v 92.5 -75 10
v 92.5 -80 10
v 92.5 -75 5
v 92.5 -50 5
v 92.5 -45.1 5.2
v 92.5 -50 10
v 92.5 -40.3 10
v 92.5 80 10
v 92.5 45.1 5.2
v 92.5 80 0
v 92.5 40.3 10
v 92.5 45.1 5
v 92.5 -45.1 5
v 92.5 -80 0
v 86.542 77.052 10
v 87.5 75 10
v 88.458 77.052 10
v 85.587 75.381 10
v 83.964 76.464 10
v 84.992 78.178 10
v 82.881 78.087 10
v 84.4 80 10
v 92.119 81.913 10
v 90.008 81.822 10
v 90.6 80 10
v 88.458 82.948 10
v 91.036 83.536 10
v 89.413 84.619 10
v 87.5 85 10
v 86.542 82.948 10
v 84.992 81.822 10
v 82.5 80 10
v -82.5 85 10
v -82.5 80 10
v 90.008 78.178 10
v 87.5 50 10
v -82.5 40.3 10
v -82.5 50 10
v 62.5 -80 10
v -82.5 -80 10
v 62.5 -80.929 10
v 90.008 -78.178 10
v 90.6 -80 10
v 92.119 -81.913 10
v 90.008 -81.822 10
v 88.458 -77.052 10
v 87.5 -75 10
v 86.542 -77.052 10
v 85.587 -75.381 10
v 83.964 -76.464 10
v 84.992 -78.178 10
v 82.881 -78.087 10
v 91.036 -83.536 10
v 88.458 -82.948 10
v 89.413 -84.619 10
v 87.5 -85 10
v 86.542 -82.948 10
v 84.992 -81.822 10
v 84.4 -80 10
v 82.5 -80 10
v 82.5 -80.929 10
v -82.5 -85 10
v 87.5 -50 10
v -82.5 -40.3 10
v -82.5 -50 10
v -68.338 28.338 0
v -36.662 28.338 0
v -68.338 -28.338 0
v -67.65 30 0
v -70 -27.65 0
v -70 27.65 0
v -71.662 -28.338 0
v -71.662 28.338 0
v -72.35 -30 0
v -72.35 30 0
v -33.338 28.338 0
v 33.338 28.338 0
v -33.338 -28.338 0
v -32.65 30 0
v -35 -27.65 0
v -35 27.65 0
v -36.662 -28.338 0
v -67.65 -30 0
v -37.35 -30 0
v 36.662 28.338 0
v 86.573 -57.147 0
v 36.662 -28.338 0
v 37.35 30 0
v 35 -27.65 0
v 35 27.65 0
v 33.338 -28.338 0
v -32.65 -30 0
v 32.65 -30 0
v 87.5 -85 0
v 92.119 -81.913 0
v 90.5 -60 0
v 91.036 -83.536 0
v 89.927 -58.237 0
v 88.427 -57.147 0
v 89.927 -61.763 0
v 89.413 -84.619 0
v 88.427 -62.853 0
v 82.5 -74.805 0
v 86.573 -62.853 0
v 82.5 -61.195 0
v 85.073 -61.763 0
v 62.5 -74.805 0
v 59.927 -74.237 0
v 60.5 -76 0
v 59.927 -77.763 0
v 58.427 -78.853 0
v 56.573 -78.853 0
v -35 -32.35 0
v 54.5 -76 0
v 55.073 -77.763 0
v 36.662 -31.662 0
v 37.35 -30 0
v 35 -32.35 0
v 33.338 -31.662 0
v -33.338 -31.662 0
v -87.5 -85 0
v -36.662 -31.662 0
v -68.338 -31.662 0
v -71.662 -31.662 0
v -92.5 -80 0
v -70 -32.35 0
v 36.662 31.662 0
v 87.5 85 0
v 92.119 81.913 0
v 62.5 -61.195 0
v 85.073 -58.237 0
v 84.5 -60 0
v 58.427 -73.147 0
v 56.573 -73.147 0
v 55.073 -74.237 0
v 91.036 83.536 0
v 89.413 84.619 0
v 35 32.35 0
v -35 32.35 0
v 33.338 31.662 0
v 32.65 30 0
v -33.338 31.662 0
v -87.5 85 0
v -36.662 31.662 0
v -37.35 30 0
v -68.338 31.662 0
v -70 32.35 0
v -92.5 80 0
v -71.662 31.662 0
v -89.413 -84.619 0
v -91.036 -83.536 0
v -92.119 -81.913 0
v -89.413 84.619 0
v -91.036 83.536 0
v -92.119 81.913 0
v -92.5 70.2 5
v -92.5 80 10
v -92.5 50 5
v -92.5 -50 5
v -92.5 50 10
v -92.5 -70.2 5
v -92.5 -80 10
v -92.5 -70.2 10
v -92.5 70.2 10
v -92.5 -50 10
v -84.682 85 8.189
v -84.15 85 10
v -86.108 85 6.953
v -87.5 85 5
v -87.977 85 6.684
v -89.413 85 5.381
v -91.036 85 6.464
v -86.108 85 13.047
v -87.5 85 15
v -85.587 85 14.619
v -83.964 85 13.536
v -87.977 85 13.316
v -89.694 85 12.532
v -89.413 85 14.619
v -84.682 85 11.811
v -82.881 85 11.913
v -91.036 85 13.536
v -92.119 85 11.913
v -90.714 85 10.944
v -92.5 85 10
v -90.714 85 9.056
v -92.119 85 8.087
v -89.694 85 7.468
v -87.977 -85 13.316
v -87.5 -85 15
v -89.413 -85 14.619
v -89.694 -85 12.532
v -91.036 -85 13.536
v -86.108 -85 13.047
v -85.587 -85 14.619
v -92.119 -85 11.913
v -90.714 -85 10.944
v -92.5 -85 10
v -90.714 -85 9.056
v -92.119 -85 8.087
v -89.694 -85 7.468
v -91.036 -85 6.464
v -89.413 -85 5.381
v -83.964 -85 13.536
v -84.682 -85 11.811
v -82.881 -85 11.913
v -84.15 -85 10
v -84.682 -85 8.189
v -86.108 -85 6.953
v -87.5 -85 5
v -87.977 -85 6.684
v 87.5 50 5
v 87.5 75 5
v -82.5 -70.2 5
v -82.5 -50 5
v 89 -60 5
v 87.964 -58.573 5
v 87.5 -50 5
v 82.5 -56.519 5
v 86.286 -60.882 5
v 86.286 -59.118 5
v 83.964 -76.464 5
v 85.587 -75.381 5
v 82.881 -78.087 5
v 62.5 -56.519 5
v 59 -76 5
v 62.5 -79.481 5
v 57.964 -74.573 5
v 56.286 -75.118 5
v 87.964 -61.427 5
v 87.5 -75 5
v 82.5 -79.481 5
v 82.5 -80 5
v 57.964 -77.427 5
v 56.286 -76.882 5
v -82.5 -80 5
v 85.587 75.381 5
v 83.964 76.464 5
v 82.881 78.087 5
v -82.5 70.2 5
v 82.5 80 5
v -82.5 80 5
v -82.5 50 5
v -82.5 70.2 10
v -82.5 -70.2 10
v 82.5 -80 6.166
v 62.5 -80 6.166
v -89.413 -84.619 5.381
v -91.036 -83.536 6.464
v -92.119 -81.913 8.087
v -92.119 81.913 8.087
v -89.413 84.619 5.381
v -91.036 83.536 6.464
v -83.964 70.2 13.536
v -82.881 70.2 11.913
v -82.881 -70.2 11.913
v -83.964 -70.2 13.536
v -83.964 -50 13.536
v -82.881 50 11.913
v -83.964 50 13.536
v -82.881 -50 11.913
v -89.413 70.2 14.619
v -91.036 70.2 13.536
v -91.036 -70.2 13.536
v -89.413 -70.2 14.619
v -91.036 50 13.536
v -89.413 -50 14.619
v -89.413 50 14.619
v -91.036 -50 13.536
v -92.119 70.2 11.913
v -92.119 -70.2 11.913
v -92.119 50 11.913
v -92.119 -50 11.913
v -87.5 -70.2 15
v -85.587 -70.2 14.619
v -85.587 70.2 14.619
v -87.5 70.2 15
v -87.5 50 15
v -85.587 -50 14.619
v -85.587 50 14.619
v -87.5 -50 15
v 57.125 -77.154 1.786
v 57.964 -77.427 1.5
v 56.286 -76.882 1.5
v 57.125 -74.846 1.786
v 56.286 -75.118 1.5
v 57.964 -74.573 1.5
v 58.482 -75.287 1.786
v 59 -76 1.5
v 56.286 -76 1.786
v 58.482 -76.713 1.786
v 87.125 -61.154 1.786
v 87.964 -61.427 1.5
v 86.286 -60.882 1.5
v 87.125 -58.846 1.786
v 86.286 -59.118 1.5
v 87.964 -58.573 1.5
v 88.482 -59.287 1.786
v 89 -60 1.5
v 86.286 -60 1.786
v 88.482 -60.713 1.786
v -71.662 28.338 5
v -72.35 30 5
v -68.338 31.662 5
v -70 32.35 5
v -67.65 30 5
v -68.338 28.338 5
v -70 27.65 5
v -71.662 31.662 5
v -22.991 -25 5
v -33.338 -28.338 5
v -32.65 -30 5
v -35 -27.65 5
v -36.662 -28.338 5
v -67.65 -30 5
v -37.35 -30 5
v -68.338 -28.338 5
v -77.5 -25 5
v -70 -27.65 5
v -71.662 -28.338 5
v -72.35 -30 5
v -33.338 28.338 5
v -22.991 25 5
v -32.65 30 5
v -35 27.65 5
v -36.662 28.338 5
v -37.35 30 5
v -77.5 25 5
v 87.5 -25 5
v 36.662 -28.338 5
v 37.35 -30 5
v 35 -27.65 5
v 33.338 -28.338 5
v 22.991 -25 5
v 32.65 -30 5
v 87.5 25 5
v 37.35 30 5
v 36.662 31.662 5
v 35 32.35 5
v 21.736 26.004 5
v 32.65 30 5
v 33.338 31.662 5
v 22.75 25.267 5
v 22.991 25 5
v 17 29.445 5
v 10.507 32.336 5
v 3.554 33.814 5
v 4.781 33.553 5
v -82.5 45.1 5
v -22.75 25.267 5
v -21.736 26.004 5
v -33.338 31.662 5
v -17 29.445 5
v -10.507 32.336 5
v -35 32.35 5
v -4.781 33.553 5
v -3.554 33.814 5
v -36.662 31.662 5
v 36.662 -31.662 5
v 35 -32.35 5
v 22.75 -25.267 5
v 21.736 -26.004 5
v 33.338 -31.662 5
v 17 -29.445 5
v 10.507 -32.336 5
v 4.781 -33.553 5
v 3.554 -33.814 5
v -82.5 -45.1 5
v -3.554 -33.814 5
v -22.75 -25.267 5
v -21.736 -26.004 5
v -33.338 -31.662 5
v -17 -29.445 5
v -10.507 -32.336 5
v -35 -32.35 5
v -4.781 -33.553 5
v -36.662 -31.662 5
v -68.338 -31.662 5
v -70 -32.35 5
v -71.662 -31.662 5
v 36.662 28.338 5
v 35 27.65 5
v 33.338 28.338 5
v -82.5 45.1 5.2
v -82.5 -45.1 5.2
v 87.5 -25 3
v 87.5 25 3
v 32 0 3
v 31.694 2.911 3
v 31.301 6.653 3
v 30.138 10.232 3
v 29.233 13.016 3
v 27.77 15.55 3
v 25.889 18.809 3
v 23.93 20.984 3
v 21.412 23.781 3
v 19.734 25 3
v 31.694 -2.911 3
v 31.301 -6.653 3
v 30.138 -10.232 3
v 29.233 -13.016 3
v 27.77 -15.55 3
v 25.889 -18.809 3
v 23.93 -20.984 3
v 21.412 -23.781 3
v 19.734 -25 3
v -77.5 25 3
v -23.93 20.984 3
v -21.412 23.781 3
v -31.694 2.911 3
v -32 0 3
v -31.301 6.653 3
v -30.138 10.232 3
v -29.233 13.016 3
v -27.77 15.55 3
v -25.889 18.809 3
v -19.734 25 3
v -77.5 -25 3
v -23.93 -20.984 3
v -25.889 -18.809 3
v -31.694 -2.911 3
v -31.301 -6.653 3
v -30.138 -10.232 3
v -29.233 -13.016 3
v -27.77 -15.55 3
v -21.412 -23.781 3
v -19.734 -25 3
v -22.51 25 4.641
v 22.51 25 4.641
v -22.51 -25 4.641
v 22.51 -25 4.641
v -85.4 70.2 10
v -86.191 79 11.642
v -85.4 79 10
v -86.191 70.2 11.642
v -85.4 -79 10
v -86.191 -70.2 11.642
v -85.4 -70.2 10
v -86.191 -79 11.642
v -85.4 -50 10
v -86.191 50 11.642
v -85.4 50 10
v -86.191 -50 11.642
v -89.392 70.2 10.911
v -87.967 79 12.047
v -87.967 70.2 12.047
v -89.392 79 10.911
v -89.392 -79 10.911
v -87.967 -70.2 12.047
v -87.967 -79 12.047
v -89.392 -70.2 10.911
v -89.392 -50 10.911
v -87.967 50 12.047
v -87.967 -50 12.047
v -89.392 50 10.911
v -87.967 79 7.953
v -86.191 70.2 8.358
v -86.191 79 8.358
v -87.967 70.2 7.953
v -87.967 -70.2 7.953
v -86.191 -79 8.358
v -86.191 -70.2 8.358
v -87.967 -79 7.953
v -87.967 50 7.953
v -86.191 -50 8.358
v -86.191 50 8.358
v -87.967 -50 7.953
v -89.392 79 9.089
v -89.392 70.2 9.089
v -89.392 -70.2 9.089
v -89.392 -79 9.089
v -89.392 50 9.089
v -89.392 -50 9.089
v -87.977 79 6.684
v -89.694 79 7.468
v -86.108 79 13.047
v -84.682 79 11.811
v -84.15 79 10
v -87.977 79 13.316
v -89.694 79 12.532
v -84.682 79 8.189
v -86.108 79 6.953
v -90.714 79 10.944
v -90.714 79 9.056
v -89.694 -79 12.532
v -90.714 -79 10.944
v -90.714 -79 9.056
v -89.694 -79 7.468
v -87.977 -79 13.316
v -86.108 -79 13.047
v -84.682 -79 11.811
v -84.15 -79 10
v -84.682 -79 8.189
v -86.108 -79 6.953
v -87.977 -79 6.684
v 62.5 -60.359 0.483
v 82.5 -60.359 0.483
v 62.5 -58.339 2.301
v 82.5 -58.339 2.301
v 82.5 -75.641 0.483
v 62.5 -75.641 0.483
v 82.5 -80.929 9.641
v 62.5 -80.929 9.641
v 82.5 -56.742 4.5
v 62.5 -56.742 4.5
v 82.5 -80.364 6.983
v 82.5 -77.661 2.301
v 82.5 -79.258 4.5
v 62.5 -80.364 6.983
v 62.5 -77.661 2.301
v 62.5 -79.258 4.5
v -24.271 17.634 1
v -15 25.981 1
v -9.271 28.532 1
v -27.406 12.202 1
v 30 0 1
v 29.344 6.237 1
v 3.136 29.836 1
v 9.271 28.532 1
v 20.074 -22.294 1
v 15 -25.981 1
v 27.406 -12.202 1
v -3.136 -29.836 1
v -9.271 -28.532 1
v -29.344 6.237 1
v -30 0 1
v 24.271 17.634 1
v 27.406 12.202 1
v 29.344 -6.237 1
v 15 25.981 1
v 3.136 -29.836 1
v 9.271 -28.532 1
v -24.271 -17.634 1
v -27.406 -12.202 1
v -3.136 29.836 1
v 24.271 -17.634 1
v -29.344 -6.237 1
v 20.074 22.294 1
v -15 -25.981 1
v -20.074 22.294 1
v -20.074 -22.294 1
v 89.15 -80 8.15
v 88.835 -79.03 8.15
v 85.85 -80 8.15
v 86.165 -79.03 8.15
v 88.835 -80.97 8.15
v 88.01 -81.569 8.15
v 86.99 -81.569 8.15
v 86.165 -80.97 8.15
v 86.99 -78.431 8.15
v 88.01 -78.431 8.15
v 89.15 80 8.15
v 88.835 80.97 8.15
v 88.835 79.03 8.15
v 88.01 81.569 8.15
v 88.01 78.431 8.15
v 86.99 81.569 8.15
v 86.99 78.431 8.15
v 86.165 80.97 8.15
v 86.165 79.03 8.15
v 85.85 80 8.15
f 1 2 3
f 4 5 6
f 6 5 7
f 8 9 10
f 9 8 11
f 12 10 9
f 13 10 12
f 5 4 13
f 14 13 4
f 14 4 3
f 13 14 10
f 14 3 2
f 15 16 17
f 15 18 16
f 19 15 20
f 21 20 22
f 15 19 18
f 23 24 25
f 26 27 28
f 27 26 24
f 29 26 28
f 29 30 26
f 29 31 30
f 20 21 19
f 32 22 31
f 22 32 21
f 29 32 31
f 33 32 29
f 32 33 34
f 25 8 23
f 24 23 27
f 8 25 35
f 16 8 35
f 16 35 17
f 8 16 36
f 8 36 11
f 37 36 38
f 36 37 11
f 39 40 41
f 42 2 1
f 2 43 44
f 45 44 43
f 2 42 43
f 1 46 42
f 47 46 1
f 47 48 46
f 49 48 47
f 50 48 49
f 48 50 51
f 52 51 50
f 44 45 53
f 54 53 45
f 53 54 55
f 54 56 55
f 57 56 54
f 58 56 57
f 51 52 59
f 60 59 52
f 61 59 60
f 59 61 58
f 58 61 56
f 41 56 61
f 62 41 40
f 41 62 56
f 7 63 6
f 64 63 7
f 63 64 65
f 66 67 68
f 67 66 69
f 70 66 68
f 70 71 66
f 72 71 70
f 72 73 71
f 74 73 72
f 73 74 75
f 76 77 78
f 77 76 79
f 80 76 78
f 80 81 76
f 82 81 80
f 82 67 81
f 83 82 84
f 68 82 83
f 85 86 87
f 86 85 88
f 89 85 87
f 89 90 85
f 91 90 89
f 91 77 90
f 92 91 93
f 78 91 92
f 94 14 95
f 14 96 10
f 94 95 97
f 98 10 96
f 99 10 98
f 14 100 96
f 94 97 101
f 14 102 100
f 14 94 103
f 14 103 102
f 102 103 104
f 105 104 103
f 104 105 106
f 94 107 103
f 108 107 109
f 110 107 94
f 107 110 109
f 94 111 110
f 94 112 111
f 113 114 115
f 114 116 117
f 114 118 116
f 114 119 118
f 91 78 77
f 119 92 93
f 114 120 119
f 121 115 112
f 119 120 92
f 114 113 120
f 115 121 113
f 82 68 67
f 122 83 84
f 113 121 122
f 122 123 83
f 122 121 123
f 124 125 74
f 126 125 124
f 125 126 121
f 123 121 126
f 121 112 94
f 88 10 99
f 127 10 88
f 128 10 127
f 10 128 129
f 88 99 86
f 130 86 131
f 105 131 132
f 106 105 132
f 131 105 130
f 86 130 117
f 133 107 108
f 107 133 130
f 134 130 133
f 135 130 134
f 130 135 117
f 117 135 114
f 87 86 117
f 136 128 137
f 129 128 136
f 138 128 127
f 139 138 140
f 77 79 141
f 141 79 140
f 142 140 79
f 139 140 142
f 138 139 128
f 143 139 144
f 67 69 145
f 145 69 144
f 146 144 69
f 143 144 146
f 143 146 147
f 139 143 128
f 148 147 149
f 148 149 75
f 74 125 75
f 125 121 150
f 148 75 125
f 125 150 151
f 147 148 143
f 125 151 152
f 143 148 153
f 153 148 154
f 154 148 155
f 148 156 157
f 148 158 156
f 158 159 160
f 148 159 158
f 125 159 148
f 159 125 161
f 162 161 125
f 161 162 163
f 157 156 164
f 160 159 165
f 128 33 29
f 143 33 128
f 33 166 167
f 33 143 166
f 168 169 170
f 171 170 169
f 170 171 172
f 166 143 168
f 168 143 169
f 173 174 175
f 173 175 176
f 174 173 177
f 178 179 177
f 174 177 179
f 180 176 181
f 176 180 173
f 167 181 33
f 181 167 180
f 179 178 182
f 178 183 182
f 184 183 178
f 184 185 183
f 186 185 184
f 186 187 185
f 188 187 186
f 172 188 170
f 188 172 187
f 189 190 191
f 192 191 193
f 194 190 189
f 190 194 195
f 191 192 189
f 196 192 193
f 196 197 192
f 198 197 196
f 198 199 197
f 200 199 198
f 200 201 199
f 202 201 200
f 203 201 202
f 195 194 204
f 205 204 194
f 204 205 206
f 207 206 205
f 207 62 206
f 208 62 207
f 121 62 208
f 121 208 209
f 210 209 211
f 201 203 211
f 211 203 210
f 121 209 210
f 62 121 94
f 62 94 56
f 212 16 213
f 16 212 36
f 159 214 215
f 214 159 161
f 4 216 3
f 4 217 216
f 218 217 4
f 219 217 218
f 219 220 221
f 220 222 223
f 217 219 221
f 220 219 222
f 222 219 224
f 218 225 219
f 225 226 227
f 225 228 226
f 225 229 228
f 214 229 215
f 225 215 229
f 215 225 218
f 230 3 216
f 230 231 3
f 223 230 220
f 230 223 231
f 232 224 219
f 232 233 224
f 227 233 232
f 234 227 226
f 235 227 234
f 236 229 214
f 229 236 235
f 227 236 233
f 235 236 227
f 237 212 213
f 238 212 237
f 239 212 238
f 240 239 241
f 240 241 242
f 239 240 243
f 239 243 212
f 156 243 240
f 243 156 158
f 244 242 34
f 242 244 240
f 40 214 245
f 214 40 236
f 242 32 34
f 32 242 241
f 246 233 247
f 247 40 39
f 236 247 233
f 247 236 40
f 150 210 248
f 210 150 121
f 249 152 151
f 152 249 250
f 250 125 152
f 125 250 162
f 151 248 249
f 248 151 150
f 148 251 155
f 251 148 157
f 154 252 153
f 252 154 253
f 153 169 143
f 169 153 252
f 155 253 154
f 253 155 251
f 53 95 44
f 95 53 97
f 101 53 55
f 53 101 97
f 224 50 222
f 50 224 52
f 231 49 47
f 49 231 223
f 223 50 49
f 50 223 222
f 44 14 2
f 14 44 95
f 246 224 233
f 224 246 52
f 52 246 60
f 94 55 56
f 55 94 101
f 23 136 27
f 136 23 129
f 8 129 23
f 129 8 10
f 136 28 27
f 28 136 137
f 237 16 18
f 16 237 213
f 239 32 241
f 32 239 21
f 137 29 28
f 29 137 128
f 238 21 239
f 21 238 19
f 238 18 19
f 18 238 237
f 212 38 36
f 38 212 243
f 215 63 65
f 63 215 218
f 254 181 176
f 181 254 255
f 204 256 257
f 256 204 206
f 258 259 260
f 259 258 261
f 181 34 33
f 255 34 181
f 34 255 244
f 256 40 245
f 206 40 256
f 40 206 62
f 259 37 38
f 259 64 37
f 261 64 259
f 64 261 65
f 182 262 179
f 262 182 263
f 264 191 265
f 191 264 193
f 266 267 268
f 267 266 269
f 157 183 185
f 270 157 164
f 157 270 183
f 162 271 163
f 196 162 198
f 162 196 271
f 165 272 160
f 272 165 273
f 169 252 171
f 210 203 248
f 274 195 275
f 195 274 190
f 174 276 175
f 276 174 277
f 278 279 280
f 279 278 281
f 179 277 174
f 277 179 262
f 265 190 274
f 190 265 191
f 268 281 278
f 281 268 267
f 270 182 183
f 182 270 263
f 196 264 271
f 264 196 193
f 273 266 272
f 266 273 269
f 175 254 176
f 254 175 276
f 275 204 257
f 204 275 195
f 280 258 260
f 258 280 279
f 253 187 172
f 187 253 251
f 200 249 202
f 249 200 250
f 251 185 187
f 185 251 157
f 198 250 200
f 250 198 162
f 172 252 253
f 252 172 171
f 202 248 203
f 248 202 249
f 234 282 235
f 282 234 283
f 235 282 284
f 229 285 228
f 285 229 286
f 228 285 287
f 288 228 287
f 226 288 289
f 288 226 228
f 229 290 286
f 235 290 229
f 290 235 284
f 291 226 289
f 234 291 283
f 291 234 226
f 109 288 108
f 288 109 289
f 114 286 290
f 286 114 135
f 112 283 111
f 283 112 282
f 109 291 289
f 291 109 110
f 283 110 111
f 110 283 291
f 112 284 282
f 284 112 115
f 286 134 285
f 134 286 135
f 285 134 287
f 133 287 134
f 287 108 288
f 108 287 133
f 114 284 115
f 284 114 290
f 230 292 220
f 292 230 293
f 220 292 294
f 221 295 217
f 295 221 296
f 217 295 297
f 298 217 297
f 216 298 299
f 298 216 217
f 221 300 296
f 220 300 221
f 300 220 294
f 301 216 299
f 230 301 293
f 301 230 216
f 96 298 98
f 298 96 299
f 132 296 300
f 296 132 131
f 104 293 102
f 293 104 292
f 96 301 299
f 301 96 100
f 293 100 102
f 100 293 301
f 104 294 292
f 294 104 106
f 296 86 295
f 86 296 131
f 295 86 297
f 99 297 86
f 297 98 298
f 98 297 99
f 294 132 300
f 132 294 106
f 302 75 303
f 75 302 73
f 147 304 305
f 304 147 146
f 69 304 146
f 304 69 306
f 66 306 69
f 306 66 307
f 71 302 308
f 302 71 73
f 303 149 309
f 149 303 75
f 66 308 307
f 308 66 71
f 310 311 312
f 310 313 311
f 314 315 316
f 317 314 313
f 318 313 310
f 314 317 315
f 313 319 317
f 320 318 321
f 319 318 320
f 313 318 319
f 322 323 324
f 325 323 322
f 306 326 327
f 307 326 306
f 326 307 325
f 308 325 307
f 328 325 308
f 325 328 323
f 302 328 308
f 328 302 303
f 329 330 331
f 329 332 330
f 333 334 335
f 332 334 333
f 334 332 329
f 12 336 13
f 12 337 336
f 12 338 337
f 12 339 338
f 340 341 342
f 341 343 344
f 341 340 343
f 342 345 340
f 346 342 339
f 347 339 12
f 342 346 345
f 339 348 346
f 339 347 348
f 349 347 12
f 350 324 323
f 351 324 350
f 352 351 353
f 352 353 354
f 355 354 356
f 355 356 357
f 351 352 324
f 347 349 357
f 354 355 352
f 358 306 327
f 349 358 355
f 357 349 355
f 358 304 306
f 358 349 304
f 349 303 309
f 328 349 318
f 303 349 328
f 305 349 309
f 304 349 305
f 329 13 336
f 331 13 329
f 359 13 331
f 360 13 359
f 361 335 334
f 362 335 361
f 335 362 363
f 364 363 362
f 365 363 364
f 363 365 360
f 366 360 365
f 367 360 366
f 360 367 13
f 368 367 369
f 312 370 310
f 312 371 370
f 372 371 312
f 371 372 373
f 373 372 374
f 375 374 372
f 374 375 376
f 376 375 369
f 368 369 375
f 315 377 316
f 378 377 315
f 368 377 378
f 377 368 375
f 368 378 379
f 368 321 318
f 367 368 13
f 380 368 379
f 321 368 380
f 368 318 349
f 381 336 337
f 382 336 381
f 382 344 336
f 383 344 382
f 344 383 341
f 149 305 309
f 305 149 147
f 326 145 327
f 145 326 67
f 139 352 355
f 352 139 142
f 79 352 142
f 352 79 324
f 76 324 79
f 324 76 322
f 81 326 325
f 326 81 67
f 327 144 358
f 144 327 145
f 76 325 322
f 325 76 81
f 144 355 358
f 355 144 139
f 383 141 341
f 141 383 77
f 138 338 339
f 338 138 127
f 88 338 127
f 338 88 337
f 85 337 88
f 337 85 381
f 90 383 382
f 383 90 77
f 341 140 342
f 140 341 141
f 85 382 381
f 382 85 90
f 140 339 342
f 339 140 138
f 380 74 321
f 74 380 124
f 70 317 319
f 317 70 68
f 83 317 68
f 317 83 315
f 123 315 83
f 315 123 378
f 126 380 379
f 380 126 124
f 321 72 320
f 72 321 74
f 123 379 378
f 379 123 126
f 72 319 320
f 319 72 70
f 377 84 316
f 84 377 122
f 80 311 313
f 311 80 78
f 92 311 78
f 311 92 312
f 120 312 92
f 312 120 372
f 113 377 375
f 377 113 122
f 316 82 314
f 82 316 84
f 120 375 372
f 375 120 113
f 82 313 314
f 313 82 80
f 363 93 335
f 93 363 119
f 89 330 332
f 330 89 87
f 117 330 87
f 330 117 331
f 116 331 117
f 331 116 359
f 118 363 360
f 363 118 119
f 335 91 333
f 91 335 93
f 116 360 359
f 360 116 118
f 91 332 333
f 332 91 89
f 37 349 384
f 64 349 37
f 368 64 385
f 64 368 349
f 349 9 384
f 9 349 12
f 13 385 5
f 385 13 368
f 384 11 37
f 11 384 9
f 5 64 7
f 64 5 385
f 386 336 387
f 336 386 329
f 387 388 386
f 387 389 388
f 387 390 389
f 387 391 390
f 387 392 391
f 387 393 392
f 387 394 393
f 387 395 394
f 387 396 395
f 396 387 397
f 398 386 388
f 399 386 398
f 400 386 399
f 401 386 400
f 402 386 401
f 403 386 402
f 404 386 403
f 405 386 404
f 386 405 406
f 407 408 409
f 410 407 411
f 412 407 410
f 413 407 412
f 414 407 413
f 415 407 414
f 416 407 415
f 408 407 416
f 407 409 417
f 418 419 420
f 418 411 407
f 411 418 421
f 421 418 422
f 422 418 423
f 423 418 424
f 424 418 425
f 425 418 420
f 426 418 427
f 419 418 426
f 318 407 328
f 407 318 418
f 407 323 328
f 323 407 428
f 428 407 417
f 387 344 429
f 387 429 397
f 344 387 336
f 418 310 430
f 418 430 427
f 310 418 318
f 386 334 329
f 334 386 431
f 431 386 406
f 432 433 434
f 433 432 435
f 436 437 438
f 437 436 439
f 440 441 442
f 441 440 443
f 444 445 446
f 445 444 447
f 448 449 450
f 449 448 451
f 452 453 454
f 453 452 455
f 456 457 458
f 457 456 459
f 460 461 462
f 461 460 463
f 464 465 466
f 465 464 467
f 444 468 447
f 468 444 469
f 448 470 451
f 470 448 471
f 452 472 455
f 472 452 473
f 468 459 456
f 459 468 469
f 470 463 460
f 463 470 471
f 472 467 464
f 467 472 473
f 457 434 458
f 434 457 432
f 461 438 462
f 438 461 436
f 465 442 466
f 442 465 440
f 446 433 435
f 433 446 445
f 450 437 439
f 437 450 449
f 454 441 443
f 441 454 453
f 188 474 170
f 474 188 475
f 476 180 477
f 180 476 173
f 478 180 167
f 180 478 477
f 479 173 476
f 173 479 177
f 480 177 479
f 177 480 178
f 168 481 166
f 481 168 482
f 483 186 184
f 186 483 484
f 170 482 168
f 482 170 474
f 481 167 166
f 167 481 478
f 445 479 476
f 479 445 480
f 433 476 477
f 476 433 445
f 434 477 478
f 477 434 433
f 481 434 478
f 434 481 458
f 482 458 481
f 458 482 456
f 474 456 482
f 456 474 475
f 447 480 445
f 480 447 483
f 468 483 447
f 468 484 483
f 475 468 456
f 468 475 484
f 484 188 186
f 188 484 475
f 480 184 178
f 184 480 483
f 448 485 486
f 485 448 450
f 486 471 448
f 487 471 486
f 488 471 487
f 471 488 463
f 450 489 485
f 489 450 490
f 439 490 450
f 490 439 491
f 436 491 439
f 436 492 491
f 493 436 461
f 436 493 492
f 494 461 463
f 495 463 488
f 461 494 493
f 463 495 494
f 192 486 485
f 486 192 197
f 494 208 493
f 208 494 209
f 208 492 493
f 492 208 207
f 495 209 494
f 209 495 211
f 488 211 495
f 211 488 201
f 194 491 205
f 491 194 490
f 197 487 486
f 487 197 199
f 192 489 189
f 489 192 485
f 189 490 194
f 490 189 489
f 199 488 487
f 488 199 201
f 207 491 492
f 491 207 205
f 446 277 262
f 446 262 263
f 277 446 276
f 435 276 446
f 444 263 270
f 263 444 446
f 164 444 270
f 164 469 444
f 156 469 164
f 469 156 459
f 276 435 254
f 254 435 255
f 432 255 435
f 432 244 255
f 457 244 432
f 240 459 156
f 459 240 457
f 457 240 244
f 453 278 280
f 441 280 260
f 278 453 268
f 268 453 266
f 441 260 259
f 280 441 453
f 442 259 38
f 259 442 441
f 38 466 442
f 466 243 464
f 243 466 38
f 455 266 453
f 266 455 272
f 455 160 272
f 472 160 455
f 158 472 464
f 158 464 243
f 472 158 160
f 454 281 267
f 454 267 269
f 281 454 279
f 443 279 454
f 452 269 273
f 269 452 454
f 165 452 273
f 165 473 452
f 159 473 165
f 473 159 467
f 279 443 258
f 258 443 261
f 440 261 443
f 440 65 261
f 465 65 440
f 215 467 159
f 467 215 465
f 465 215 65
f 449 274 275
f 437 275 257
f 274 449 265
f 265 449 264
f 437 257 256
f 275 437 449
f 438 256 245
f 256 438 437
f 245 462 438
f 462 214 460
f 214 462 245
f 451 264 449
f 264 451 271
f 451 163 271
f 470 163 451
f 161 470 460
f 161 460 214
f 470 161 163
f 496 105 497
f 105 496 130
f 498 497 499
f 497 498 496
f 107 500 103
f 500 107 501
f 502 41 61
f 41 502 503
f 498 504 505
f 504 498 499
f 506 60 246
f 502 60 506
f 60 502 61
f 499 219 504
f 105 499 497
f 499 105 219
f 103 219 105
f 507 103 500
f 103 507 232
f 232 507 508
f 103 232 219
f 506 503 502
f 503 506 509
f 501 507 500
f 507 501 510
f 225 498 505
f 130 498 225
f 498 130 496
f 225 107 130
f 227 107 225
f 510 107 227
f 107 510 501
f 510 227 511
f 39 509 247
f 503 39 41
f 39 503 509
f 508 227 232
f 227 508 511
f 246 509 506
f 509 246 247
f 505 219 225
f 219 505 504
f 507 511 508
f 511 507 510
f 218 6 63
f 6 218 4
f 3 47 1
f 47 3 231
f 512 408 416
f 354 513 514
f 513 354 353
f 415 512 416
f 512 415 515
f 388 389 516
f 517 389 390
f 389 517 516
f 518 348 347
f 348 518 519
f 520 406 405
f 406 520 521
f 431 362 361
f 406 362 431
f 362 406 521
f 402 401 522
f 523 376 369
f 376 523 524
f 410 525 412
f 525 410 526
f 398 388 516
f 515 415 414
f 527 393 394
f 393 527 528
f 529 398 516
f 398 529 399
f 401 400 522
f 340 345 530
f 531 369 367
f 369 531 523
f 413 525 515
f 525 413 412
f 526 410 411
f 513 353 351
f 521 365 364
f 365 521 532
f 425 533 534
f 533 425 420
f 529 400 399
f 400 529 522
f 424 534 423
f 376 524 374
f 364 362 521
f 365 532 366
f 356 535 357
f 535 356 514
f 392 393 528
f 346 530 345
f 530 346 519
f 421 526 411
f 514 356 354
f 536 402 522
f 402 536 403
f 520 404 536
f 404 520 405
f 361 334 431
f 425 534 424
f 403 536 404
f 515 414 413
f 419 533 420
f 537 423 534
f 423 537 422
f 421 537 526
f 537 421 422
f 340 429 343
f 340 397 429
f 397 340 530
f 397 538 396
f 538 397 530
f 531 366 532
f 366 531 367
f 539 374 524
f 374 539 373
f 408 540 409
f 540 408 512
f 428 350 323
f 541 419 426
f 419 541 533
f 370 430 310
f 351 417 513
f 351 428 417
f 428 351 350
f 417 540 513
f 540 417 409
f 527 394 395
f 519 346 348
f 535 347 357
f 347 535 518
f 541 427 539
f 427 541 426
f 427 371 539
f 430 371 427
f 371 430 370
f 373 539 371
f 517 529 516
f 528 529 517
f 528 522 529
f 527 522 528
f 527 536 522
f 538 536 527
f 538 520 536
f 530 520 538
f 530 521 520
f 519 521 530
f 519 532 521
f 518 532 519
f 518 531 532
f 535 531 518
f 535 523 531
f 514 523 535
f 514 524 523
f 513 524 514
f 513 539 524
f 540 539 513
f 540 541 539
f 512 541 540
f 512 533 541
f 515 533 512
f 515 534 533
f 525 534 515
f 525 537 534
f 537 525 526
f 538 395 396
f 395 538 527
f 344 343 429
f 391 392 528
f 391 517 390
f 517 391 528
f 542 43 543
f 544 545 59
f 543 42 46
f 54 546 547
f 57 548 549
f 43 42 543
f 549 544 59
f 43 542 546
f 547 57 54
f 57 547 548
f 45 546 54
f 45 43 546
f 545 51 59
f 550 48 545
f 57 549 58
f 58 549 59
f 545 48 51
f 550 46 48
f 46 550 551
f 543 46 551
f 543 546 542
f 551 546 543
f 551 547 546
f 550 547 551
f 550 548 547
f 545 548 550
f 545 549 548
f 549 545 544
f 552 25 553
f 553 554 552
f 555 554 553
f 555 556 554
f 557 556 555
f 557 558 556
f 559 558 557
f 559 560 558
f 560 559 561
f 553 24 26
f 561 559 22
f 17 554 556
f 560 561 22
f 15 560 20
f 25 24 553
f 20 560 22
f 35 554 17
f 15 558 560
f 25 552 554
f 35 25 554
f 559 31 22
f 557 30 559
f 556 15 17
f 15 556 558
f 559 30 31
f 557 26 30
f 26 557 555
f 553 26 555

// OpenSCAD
// file: config_4x5.scad
/*
This is the base configuration file for the 4x5" format
# we are not using the exact ANSI measures, but slightly rounded measures for slight simplification
*/
vStabilizerTotal_h = 7;

// general tolerance
vTolerance = 0.2;

// sheet film and cassette measurements (roughly based on the ANSI measurements)
vFilmSheet_l = 127;
vFilmSheet_w = 102;
vCassette_l = 160; // A min
vCassette_w = 121; // B max
vCassette_h = 13.2; // C max
vLightTrap_l = 2; // M2
vLightTrap_w = vCassette_w;
vLightTrap_h = 1.5; // M1
vLightTrap_offsetX = 141; // G max
vFilmWindow_l = 121;
vFilmWindow_w = 101;
vFilmWindow_offsetX = 16;
vGroundGlass_offsetZ = 5;

// Graflok
vGraflok_h = 6; // this is not the official measurement, just measured from a camera 

// lens board measures (we are using Wista/Technika-style lensboards)
vLensboard_l = 100;
vLensboard_w = 97;
vLensboard_h = 2;
vLensboard_offsetX = -(vLensboard_l+3)/2; // caution: we have an asymetric offset!
vLensboard_offsetY = -vLensboard_w/2;
vLensboardHole_d = 85;
vLensboardLighttrap_d = 89;
vLensboardLighttrap_h = 1+vTolerance;

// bellows frame measures - the bellows frame design is derived from standardcameras.com
// back frame
vBellowsBackInner_l = 144; //???? check and replace with the measurement from your bellows!
vBellowsBackInner_w = vBellowsBackInner_l;
vBellowsBackOuter_l = vBellowsBackInner_l+1;
vBellowsBackOuter_w = vBellowsBackOuter_l;

vBellowsBackFrameOuter_l = 159;
vBellowsBackFrameOuter_w = vBellowsBackFrameOuter_l;
vBellowsBackFrameOuter_h = 7;
vBellowsBackFrameInner_l = 135;
vBellowsBackFrameInner_w = vBellowsBackFrameInner_l;
vBellowsBackFrameInner_h = 5;

vBellowsBackLightTrapOuter_l = vBellowsBackFrameInner_l+2*2;
vBellowsBackLightTrapOuter_w = vBellowsBackLightTrapOuter_l;
vBellowsBackLightTrap_h = 3;

//vBellowsBackFrameScrewHole_d = 2;
//vBellowsBackFrameScrewHole_h = 10;
vBellowsBackFrameScrewHole_offsetXY = 70;
vBellowsBackFrameScrewHole_offsetZ = vBellowsBackFrameOuter_h/2;

// front frame
vBellowsFrontInner_l = 94; //???? check and replace with the measurement from your bellows!
vBellowsFrontInner_w = vBellowsFrontInner_l;
vBellowsFrontOuter_l = vBellowsFrontInner_l+1;
vBellowsFrontOuter_w = vBellowsFrontOuter_l;

vBellowsFrontFrameOuter_l = 104;
vBellowsFrontFrameOuter_w = vBellowsFrontFrameOuter_l;
vBellowsFrontFrameOuter_h = 7;
vBellowsFrontFrameInner_l = 82;
vBellowsFrontFrameInner_w = vBellowsFrontFrameInner_l;
vBellowsFrontFrameInner_h = 5;

vBellowsFrontLightTrapOuter_l = vBellowsFrontFrameInner_l+2*2;
vBellowsFrontLightTrapOuter_w = vBellowsFrontLightTrapOuter_l;
vBellowsFrontLightTrap_h = 0;

//vBellowsFrontFrameScrewHole_d = 2;
//vBellowsFrontFrameScrewHole_h = 10;
vBellowsFrontFrameScrewHole_offsetXY = 40;
vBellowsFrontFrameScrewHole_offsetZ = vBellowsFrontFrameOuter_h/2;

// body dimensions
vWall_strength = 5;
vBodyOuter_l = 185; // make sure this is at least 4*vWall_strength larger than vBellowsBackFrameOuter_l!
vBodyOuter_w = 170; // make sure this is at least 2*vWall_strength larger than vBellowsBackFrameOuter_l!
vBodyOuter_h = 65;
vBodyEdge_r = vWall_strength;

// we will center our model on the Y axis and on the center of the bellows frame
// at least for the 4x5 version, we have to do an asymetric offset of 2.5mm on the X-axis 
vAsymOffsetX = -2.5;  

// back plate
vBackPlateLength = 160; // we will probably use about the same size as the bellows back frame
vBackPlateStrength = vWall_strength;

// hinges for front lid
vHingeInnerDistance = 100;
vHingeBaseWidth = 20;
vHingeHole = 4;

// lid lock measures
vLidLockBase_d = 8;
vLidLockHole_distance = 70;

// rail dimensions
vLowerRail_w = 90;
vUpperRail_w = vLowerRail_w;

// cutout for stop indents
vStopIndent_l = 4;
vStopIndent_h = 5;
vStopIndentDistance = 25; // shorter than 25 is not necessary
vStopIndent_offsetX = 20; // don't go shorter than 20 if you intend to use a 90mm lens!

// for all dovetails we use a base width of 5mm and a base height of 5mm
// we are applying tolerances to the inner AND outer part of a dovetail, in width and height
vDoveTail_w = 5;
vDoveTail_h = 5;
vDoveTail_tolerance = 0.2;

// front standard carrier / slider
// width is depending on vUpperRail_w
vSliderBase_w = vUpperRail_w + (4*vDoveTail_w);
vSliderBase_l = 40; // make sure to have enough space in the body.


// lever plate 
vLeverPlateBase_w = vUpperRail_w - (8*vDoveTail_w);
vLeverPlateBlock_w = 25;
vLeverPlateBlock_l = vSliderBase_l-(2*vDoveTail_w);

vFrontStandard_h = 130;
vFrontStandardSlot_h = vFrontStandard_h - 30;

// lensboard carrier
vFrontPlate_length = vSliderBase_w+6; // vSliderBase_w is a bit too tight for 4x5", so there we will add 5mm, for 5x7 vSliderBase_w is OK to get a squared lensboard carrier
vFrontPlate_width = vSliderBase_w; //vFrontPlate_length;
vFrontPlate_height = 16;
vEdgeCutCylinder = floor(sqrt(2*pow(vFrontPlate_width,2)))-5;

vTiltDovetailBase_d1 = 30;
vTiltDovetailBase_d2 = vTiltDovetailBase_d1+(2*vDoveTail_w);
vTiltDovetailBaseBlock_d = vTiltDovetailBase_d1+(4*vDoveTail_w);

vTiltDovetail_d1 = vTiltDovetailBase_d1-vTolerance;
vTiltDovetail_d2 = vTiltDovetailBase_d2-vTolerance;
vTiltDovetail_h = vDoveTail_w-vTolerance;

vTiltDovetailCutout_d1 = vTiltDovetailBase_d2+vTolerance;
vTiltDovetailCutout_d2 = vTiltDovetailBase_d1+vTolerance;

vAxisHole_d = 10+vTolerance;
vAxisHole_h = vDoveTail_w+vTolerance;

vTiltLockBolt_d = 12;
vTiltLockBolt_h = 14;
//vTiltLockBoltHole_d = 8;
//vTiltLockBoltHole_h = vTiltLockBolt_h;

vTiltHeight = 50;
vTiltRadius = vFrontPlate_length/2;
vTiltAngleMinus = -7;
vTiltAnglePlus = 7;
vTiltAxis_d = 10-vTolerance;

// focusing rod
vFocusingRod_d = 6;
vFocusingKnob_d = 25;
vFocusingKnob_h = 20;

// stabilizer measures (just the outer measures of our stabilizer block, not the tripod slider)
vStabilizerBase_l = 135;
vStabilizerBase_w = 90;  
vStabilizerBase_h = 7;
vStabilizerDovetailBase_w = 50;
// screw holes for the stabilizer
vLidHoleCount_x = 4;
vLidHoleDist_x = 35;
vLidHoleCount_y = 2;
vLidHoleDist_y = 60;


// screw diameters, length is individually set
vScrew1Hole_d = 3;
vScrew1ThreadHole_d = 2.2;
vScrew2Hole_d = 2;
vScrew2ThreadHole_d = 1.4;


// Dimensions for small heat set insert holes.
// Sized for M2 inserts, 3 mm depth, 3.5 mm max OD
// (may be labelled M2x3.5x3)
vInsertM2Hole_d = 3.2;
vInsertM2MinDepth_h = 4.0;
vInsertM2Size_d = 3.5;
vInsertM2Depth_h = 3.0;

// Dimensions for heat set insert holes.
// Sized for "Voron standard" M3 inserts, 4 mm depth, 5 mm max OD
// (variously labelled M3x4x5 or M3x5x4)
vInsertM3Hole_d = 4.7;
vInsertM3MinDepth_h = 5.0;
vInsertM3Size_d = 5.0;
vInsertM3Depth_h = 4.0;

// Dimensions for large heat set insert holes.
// Sized for M5 inserts, 5 mm depth, 7 mm max OD
// (may be labelled M5x7x5)
vInsertM5Hole_d = 6.7;
vInsertM5MinDepth_h = 6.0;
vInsertM5Size_d = 7.0;
vInsertM5Depth_h = 5.0;
// file: modules.scad
/*
This is a collection of the modules which are used heavily within the whole project.
Almost all parts rely on the modules to remain "as is", especially regarding their current orientation.
So please act very carefully here, otherwise you may screw up the complete design!

*/
include <baseconfig.scad>;


// roof module - this is heavily used for dovetail cutouts
// please keep as is
module roof(l, w, h){
    polyhedron(
        points=[
            [0,0,0],
            [l,0,0],
            [l,w,0],
            [0,w,0],
            [0,w/2,h],
            [l,w/2,h]
            ],
        faces=[
            [0,1,2,3],
            [0,4,1],
            [1,4,5,2],
            [2,5,3],
            [3,5,4,0]
            ]
            );
    };

// a wedge module - this is heavily used for cutting edges
// please keep as is    
module wedge(l, w, h) {
    polyhedron(
            points=[
                [0,0,0],
                [l,0,0],
                [l,w,0],
                [0,w,0],
                [0,0,h],
                [l,0,h]
            ],
            faces=[
                [0,3,2,1],
                [0,1,5,4],
                [1,2,5],
                [2,3,4,5],
                [3,0,4]
            ]
    );
   };

// simple tube module.   
module tube(d1, d2, h) {
    difference() {
        cylinder(d=d1, h=h);
        cylinder(d=d2, h=h);
        };
    };

// mainly used for making holes for countersunk screws
// please keep as is    
module countersunk_screw(vScrew_d, vScrew_l){
    union(){
    cylinder(d=vScrew_d, h=vScrew_l);
    cylinder(d1=vScrew_d*2, d2=0, h=vScrew_d);
    };
};

// module for making hexagons, e.g. hex nuts. kw is the key width
// please keep as is
module hex(kw, h) {
	render()
        translate([0, 0, h/2])
            intersection_for(a = [0, 120, 240]) {
                rotate([0, 0, a])
                    cube([kw, 3 * kw, h], true);
                }
}


// Heatset insert
// d: Thread diameter
// od: Outer diameter
// l: Total length
module insert(d, od, l)
{
    echo(Insert = d, od, l);
    difference() {
        cylinder(l, d=od, $fn=15);
        translate([0, 0, -0.5]) cylinder(l+1, d=d, $fn=15);
        };
}

module insert_m2()
{
    color("gold") insert(2, vInsertM2Size_d, vInsertM2Depth_h);
}

module insert_m3()
{
    color("gold") insert(3, vInsertM3Size_d, vInsertM3Depth_h);
}

module insert_m5()
{
    color("gold") insert(5, vInsertM5Size_d, vInsertM5Depth_h);
}

// Countersunk screw, metric, for display
// Example: https://www.aliexpress.com/item/1005007838338973.html
module screw_cs(l, d=3, dk=6, s=2, t=1) {
    // l: total length (including head) in mm
    // d: thread diameter (eg 3 for M3)
    // dk: max head diameter
    // s: hex socket flat-to-flat size
    // t: hex socket depth
    echo(CountersunkScrew = d, l);
    difference() {
        union() {
            cylinder(h=l, r=d/2, $fn=15);
            cylinder(h=(dk-d)/2, r1=dk/2, r2=d/2, $fn=15);
            }
        cylinder(h=t, r=s/2*2/sqrt(3), $fn=6);
    }
}

module screw_m3_cs(l) {
    color("silver") screw_cs(l, d=3, dk=6, s=2, t=1);
}

module screw_m2_cs(l) {
    color("silver") screw_cs(l, d=2, dk=3.8, s=1.5, t=0.75);
}
module screw_m5_cs(l) {
    color("silver") screw_cs(l, d=5, dk=9.5, s=3, t=1.6);
}

// Button head screw, metric, for display
// Example: https://www.aliexpress.com/item/32967225441.html
module screw_bh(l, d=3, k=1.5, dk=5.5, s=2, t=1) {
    // l: shaft length (NOT including head) in mm
    // d: thread diameter (eg 3 for M3)
    // k: head depth
    // dk: head max diameter
    // s: hex socket flat-to-flat size
    // t: hex socket depth
    echo(ButtonheadScrew = d, l);
    difference() {
        union() {
            translate([0, 0, k]) cylinder(h=l, r=d/2, $fn=15);
            difference() {
                translate([0, 0, k]) intersection() {
                    sphere(d=dk, $fn=15);
                    translate([-dk/2, -dk/2, -dk]) cube(dk);
                }
                translate([-dk/2, -dk/2, -dk]) cube(dk);
            }
        }
        cylinder(h=t, r=s/2*2/sqrt(3), $fn=6);
    }
}

module screw_m2_bh(l) {
    color("silver") screw_bh(l, d=2, dk=3.4, s=1.175, t=0.6);
}

module screw_m3_bh(l) {
    color("silver") screw_bh(l, d=3, dk=5.7, s=2, t=1);
}


module nut_m5() {
    echo(Nut = 5);
    difference() {
        rotate([0, 0, 30]) cylinder(h=3.9, d=8*2/sqrt(3), $fn=6);
        cylinder(h=5, d=5, $fn=15);
        }
    }
    
    
module thumbscrew(bolt_d, bolt_dk, screw_d, screw_h, n_knurls, knurl_d, knurl_f) {
    // bolt_d:  central bolt diameter
    // bolt_dk: bolt head max diameter
    // screw_d: thumbscrew outer diameter
    // screw_h: thumbscrew height
    // n_knurls: number of knurls
    
    min_knurl_offset = screw_d/2 - knurl_d;
    max_knurl_offset = screw_d/2 + knurl_d;
    knurl_offset = min_knurl_offset + knurl_f*(max_knurl_offset - min_knurl_offset);
    
    difference()
    {
        union()
        {
            translate([0, 0, 1]) cylinder(screw_h-2, d=screw_d);
            cylinder(1, d1=screw_d-1, d2=screw_d);
            translate([0, 0, screw_h-1]) cylinder(1, d1=screw_d, d2=screw_d-1);
        }
        cylinder(screw_h, d=bolt_d);
        cylinder(bolt_dk/2, d1=bolt_dk, d2=0);
        for (i = [1:n_knurls])
        {
            rotate([0, 0, i*360/(n_knurls)]) translate([knurl_offset, 0, 0]) cylinder(screw_h, d=knurl_d);
        }
    }
}

module thumbscrew_m5(screw_d, screw_h, n_knurls, knurl_d, knurl_f) {
    thumbscrew(5, 9.5, screw_d, screw_h, n_knurls, knurl_d, knurl_f);
}


module t6_flange_coupler() {
    // T6 flange coupler
    // Example: https://www.aliexpress.com/item/1005008049363389.html
    echo(FlangeCoupler = 6);
    difference() {
        union() {
            translate([0, 0, 2]) cylinder(h=10, d=10);
            cylinder(h=2, d=22);
        }
        cylinder(h=12, d=6);
        translate([0, 15, 7]) rotate([90, 0, 0]) cylinder(h=30, d=3);
        for (i = [0:3]) {
            rotate([0, 0, 45+90*i]) translate([-8, 0, 0]) cylinder(h=2, d=3);
        }
    }
}


module AXK0619_thrust_bearing() {
    echo(ThrustBearing = "AXK0619");
    difference() {
        cylinder(h=4, d=19);
        cylinder(h=4, d=6);
    }
}


module t6_lead_screw(l) {
    echo(LeadScrewT6 = l);
    color("silver") cylinder(h=l, d=6);
}

module t6_lead_screw_nut() {
    echo("LeadScrewT6Nut");
    intersection()
    {
        difference() {
            union() {
                cylinder(h=15, d=12);
                translate([0, 0, 1.5]) cylinder(h=3.5, d=24);
            }
            cylinder(h=15, d=6);
        }  
        translate([-50, -12.5/2, -50]) cube([100, 12.5, 100]);
    }
}

module threaded_rod_m5(l) {
    echo(ThreadedRodM5 = l);
    color("silver") cylinder(h=l, d=5);
}

module smooth_rod_m4(l) {
    echo(SmoothRodM4 = l);
    color("silver") cylinder(h=l, d=4);
}


module screw_m3_grub(l) {
    echo(GrubScrew = 3, l);
    color("silver") cylinder(h=l, d=3, $fn=15);
}


module screw_m5_grub(l) {
    echo(GrubScrew = 5, l);
    color("silver") cylinder(h=l, d=5, $fn=15);
}


module washer_m6() {
    // M6x12x0.8 washer
    echo(Washer = 6, 0.8);
    difference() {
        cylinder(h=0.8, d=12);
        cylinder(h=0.8, d=6.6);
    }
}


module springwasher_m6() {
    // M6x12x1.5 washer (compresses to 0.5)
    // Show as compressed (~0.5 mm height)
    echo(SpringWasher = 6);
    difference() {
        cylinder(h=0.5, d=12);
        cylinder(h=0.6, d=6);
    }
}
// file: baseconfig.scad
/*
Here we define some variables which are independent from the camera format
*/


// some generic variables

// we are including a format specific configuration sheet - but make sure to include only one!

include <config_4x5.scad>;
// include <config_5x7.scad>;
// include <config_8x10.scad>;

// Arca Swiss tripod plate
// caution: some Arca Swiss compatible tripod heads may have slight variations
// vArca_length = xx; // the length is irrelevant here
vArca_width = 38;
vArca_height = 7;
vArcaBase_cutout = 4;
vArcaBase_height = 1.5;
// main file
// loading the base configuration
include <baseconfig.scad>;

// some modules such as hex, countersunk screws, roof, wedge are available in a module file
use <modules.scad>;


module front_lid() {

// our outer frame measurements - caution overall
vFrontLidOuter_l = vBodyOuter_l;
vFrontLidOuter_w = vBodyOuter_w;
vFrontLidOuter_h = 2*vWall_strength;
vFrontLid_wall = vWall_strength;
vFrontLidOuter_offsetX = -vFrontLidOuter_l/2;
vFrontLidOuter_offsetY = -vFrontLidOuter_w/2;
vFrontLidOuter_offsetZ = 0;

vFrontLidInner_l = vFrontLidOuter_l-(2*vFrontLid_wall); // on X-axis
vFrontLidInner_w = vFrontLidOuter_w-(2*vFrontLid_wall); // on Y-axis
vFrontLidInner_h = vFrontLidOuter_h-vFrontLid_wall;
vFrontLidInner_offsetX = -vFrontLidInner_l/2;
vFrontLidInner_offsetY = -vFrontLidInner_w/2;
vFrontLidInner_offsetZ = vFrontLid_wall;

// our edges depend on the wall strength
vEdgeBolt_d = 2*vFrontLid_wall;
vEdgeBolt_h = 2*vFrontLid_wall;
vEdgeBolt_offsetX = vFrontLidInner_offsetX;
vEdgeBolt_offsetY = vFrontLidInner_offsetY;
vEdgeBolt_offsetZ = 0;

vEdgeBoltCone_d2 = vEdgeBolt_d-4+vTolerance;
vEdgeBoltCone_d1 = (vEdgeBoltCone_d2/2)+vTolerance;
vEdgeBoltCone_h = (vEdgeBoltCone_d1/2)+vTolerance;
vEdgeBoltCone_offsetZ = vEdgeBolt_h-vEdgeBoltCone_h;

// rails
vRailTolerance = vTolerance;

vRailBlock_l = vFrontLidOuter_l;
vRailBlock_w = vLowerRail_w+10; // 5mm on each side is sufficient
vRailBlock_h = vDoveTail_h;
vRailBlock_offsetX = -vRailBlock_l/2;
vRailBlock_offsetY = -vRailBlock_w/2;
vRailBlock_offsetZ = vFrontLid_wall;

// cutout via roof
vRailCutout_l = vFrontLidInner_l;
vRailCutout_w = vLowerRail_w + vRailTolerance;
vRailCutout_h = vRailCutout_w/2;
vRailCutout_offsetX = vRailBlock_offsetX + 2*vFrontLid_wall;
vRailCutout_offsetY = vRailCutout_w/2;
vRailCutout_offsetZ = vFrontLid_wall;

vRailMidCutout_l = vFrontLidInner_l-10;
vRailMidCutout_w = vRailBlock_w/2;
vRailMidCutout_h = 2;
vRailMidCutout_offsetX = -(vRailMidCutout_l/2)+5;
vRailMidCutout_offsetY = -vRailMidCutout_w/2;
vRailMidCutout_offsetZ = vFrontLid_wall-vRailMidCutout_h;

// hinges
vHingeTolerance = vTolerance;
vHingeTubeOuter_r = vFrontLid_wall;
vHingeTubeOuter_h = vFrontLidOuter_w;
vHingeTubeInner_d = vHingeHole+vHingeTolerance;
vHingeTube_offsetX = vFrontLidInner_offsetX;
vHingeTube_offsetY = -vFrontLidOuter_offsetY;
vHingeTube_offsetZ = vFrontLidOuter_h;

vHingeCutout_l = 2*vFrontLid_wall;
vHingeCutout_w = vHingeBaseWidth+vHingeTolerance;
vHingeCutout_h = vHingeCutout_l;
vHingeCutout_offsetX = vFrontLidOuter_offsetX;
vHingeCutout_offsetY = vHingeInnerDistance/2;
vHingeCutout_offsetZ = vFrontLid_wall;



// lens indent
vLensIndent_d2 = 70;
vLensIndent_d1 = vLensIndent_d2-(2*vFrontLid_wall);
vLensIndent_h = vFrontLid_wall;
vLensIndent_offsetX = 0;
vLensIndent_offsetY = 0;
vLensIndent_offsetZ = 1;


vFocusingKnobCutout_d = vFocusingKnob_d+1;
vFocusingKnobCutout_l = vFocusingKnob_h;
vFocusingKnobCutout_offsetX = -vFrontLidOuter_offsetX-vFocusingKnobCutout_l-10;
vFocusingKnobCutout_offsetY = -(vBodyOuter_w/2)+10+7; // focus lever length - 7mm
vFocusingKnobCutout_offsetZ = 6+vFrontLid_wall;

vFocusingBlockScrew_d = vScrew1Hole_d;
vFocusingBlockScrew_h = 10;
vFocusingBlockScrew1_offsetX = vFocusingKnobCutout_offsetX-5;
vFocusingBlockScrew1_offsetY = vFocusingKnobCutout_offsetY+8;

vFocusingBlockScrew2_offsetX = vFocusingKnobCutout_offsetX-5;
vFocusingBlockScrew2_offsetY = vFocusingKnobCutout_offsetY-8;

vFocusingBlockScrew3_offsetX = vFocusingKnobCutout_offsetX+vFocusingKnobCutout_l+5;
vFocusingBlockScrew3_offsetY = vFocusingKnobCutout_offsetY+8;

vFocusingBlockScrew4_offsetX = vFocusingKnobCutout_offsetX+vFocusingKnobCutout_l+5;
vFocusingBlockScrew4_offsetY = vFocusingKnobCutout_offsetY-8;

vFocusingBlockScrew_offsetZ = 0;

vFocusingBlockCutout_l = vFrontLid_wall;
vFocusingBlockCutout_w = (vFrontLidOuter_w-vRailBlock_w-(2*vEdgeBolt_d))/2; 
vFocusingBlockCutout_h = vFrontLid_wall;
vFocusingBlockCutout_offsetX = -vFrontLidInner_offsetX;
vFocusingBlockCutout_offsetY = vFrontLidInner_offsetY+vFrontLid_wall;
vFocusingBlockCutout_offsetZ = vFrontLid_wall;

// Insert holes for the stabilizing lid
vLidHole_d = vInsertM3Hole_d;
vLidHole_h = vInsertM3MinDepth_h;
assert(vFrontLid_wall >= vInsertM3MinDepth_h);

vLidHoleRow_length = (vLidHoleCount_x-1)*vLidHoleDist_x;
vLidHoleRow_offsetX = -vLidHoleRow_length/2-17.5;
vLidHoleRow_offsetY = vLidHoleDist_y/2;
vLidHoleRow_offsetZ = 0; // No offset to enable easy insert installation



difference(){
    union(){
        difference(){
            union(){
                // base plate in x direction
                translate([vFrontLidOuter_offsetX, vFrontLidInner_offsetY, vFrontLidOuter_offsetZ])
                    cube([vFrontLidOuter_l, vFrontLidInner_w, vFrontLidOuter_h]);
                // base plate in y direction
                translate([vFrontLidInner_offsetX, vFrontLidOuter_offsetY, vFrontLidOuter_offsetZ])
                    cube([vFrontLidInner_l, vFrontLidOuter_w, vFrontLidOuter_h]);
            };

            // cutout (we get a little bit asymmetric here, because we want to have a double strength wall below our hinges)
            translate([vFrontLidInner_offsetX+vFrontLid_wall, vFrontLidInner_offsetY, vFrontLidInner_offsetZ])
                cube([vFrontLidInner_l-vFrontLid_wall, vFrontLidInner_w, vFrontLidInner_h]);
        };


        // edge bolts
        translate([vEdgeBolt_offsetX, vEdgeBolt_offsetY, vEdgeBolt_offsetZ])
            cylinder(d=vEdgeBolt_d, h=vEdgeBolt_h);

        translate([vEdgeBolt_offsetX, -vEdgeBolt_offsetY, vEdgeBolt_offsetZ])
            cylinder(d=vEdgeBolt_d, h=vEdgeBolt_h);

        translate([-vEdgeBolt_offsetX, vEdgeBolt_offsetY, vEdgeBolt_offsetZ])
            cylinder(d=vEdgeBolt_d, h=vEdgeBolt_h);

        translate([-vEdgeBolt_offsetX, -vEdgeBolt_offsetY, vEdgeBolt_offsetZ])
            cylinder(d=vEdgeBolt_d, h=vEdgeBolt_h);

        // rail block
        translate([vRailBlock_offsetX, vRailBlock_offsetY, vRailBlock_offsetZ])
            cube([vRailBlock_l, vRailBlock_w, vRailBlock_h]);

        // hinge tube
        translate([vHingeTube_offsetX, vHingeTube_offsetY, vHingeTube_offsetZ])
            rotate([90, 0, 0])
                cylinder(r=vHingeTubeOuter_r, h=vHingeTubeOuter_h);
        /*        
        // back thread block
        translate([vBackThreadBlock_offsetX, vBackThreadBlock_offsetY, vBackThreadBlock_offsetZ])
            cube([vBackThreadBlock_l, vBackThreadBlock_w, vBackThreadBlock_h]);
        
        translate([vBackThreadBlock_offsetX, vFocusingRodHole_offsetY, vFocusingRodHole_offsetZ])
            rotate([0, 90, 0])
                cylinder(d=vBackThreadBlock_d, h=vBackThreadBlock_l);    
       */
        
    };
    
    // rail cutout
    translate([vRailCutout_offsetX, -vRailCutout_offsetY, vRailCutout_offsetZ])
        cube([vRailCutout_l, vRailCutout_w, vRailTolerance]);
    
    translate([vRailCutout_offsetX, -vRailCutout_offsetY, vRailCutout_offsetZ+vRailTolerance])
        roof(vRailCutout_l, vRailCutout_w, vRailCutout_h);
    
    translate([vRailMidCutout_offsetX, vRailMidCutout_offsetY, vRailMidCutout_offsetZ])
        cube([vRailMidCutout_l, vRailMidCutout_w, vRailMidCutout_h]);
     
    // hinge hole
    translate([vHingeTube_offsetX, vHingeTube_offsetY, vHingeTube_offsetZ])
        rotate([90, 0, 0])
            cylinder(d=vHingeTubeInner_d, h=vHingeTubeOuter_h);
    
    // Hinge insert holes
   translate([vHingeTube_offsetX, vHingeTube_offsetY, vHingeTube_offsetZ])
        rotate([90, 0, 0])
            cylinder(d=vInsertM5Hole_d, h=vInsertM5MinDepth_h);
   translate([vHingeTube_offsetX, -vHingeTube_offsetY, vHingeTube_offsetZ])
        rotate([-90, 0, 0])
            cylinder(d=vInsertM5Hole_d, h=vInsertM5MinDepth_h);
    
    
    // hinge cutouts
    translate([vHingeCutout_offsetX, vHingeCutout_offsetY, vHingeCutout_offsetZ])
        cube([vHingeCutout_l, vHingeCutout_w, vHingeCutout_h]);
    translate([vHingeCutout_offsetX, -vHingeCutout_offsetY-vHingeCutout_w, vHingeCutout_offsetZ])
        cube([vHingeCutout_l, vHingeCutout_w, vHingeCutout_h]);
    
     
    // focusing knob cutout
    translate([vFocusingKnobCutout_offsetX, vFocusingKnobCutout_offsetY, vFocusingKnobCutout_offsetZ])
        rotate([0, 90, 0])
            cylinder(d=vFocusingKnobCutout_d, h=vFocusingKnobCutout_l);
            
    // cutout in front wall for focusing block
    translate([vFocusingBlockCutout_offsetX, vFocusingBlockCutout_offsetY, vFocusingBlockCutout_offsetZ])
        cube([vFocusingBlockCutout_l, vFocusingBlockCutout_w, vFocusingBlockCutout_h]);
    
    // screw holes for front focusing block
    
    translate([vFocusingBlockScrew2_offsetX, vFocusingBlockScrew2_offsetY, vFocusingBlockScrew_offsetZ])
        countersunk_screw(vFocusingBlockScrew_d, vFocusingBlockScrew_h);
    
    translate([vFocusingBlockScrew3_offsetX, vFocusingBlockScrew3_offsetY, vFocusingBlockScrew_offsetZ])
        countersunk_screw(vFocusingBlockScrew_d, vFocusingBlockScrew_h);
    
   
    // lens indent
    translate([vLensIndent_offsetX, vLensIndent_offsetY, vLensIndent_offsetZ])
        cylinder(d1=vLensIndent_d1, d2=vLensIndent_d2, h=vLensIndent_h);
    
    // Insert holes for screwing the stabilizer lid
    // Suppress holes for i = 2 as these impinge on the lens indent
    translate([vLidHoleRow_offsetX, vLidHoleRow_offsetY, vLidHoleRow_offsetZ])
    for (i = [0:vLidHoleCount_x-1]){ 
        if (i != 2) {
        translate([i*vLidHoleDist_x, 0, 0])
        cylinder(d=vLidHole_d, h=vLidHole_h); }
    };
    
    translate([vLidHoleRow_offsetX, -vLidHoleRow_offsetY, vLidHoleRow_offsetZ])
    for (i = [0:vLidHoleCount_x-1]){ 
        if (i != 2) {
        translate([i*vLidHoleDist_x, 0, 0])
        cylinder(d=vLidHole_d, h=vLidHole_h); }
    };
    
    // cones for edge bolts from body
    translate([-vEdgeBolt_offsetX, vEdgeBolt_offsetY, vEdgeBoltCone_offsetZ])
        cylinder(d1=vEdgeBoltCone_d1, d2=vEdgeBoltCone_d2, h=vEdgeBoltCone_h);
    translate([-vEdgeBolt_offsetX, -vEdgeBolt_offsetY, vEdgeBoltCone_offsetZ])
        cylinder(d1=vEdgeBoltCone_d1, d2=vEdgeBoltCone_d2, h=vEdgeBoltCone_h);
    
};


};

front_lid();
